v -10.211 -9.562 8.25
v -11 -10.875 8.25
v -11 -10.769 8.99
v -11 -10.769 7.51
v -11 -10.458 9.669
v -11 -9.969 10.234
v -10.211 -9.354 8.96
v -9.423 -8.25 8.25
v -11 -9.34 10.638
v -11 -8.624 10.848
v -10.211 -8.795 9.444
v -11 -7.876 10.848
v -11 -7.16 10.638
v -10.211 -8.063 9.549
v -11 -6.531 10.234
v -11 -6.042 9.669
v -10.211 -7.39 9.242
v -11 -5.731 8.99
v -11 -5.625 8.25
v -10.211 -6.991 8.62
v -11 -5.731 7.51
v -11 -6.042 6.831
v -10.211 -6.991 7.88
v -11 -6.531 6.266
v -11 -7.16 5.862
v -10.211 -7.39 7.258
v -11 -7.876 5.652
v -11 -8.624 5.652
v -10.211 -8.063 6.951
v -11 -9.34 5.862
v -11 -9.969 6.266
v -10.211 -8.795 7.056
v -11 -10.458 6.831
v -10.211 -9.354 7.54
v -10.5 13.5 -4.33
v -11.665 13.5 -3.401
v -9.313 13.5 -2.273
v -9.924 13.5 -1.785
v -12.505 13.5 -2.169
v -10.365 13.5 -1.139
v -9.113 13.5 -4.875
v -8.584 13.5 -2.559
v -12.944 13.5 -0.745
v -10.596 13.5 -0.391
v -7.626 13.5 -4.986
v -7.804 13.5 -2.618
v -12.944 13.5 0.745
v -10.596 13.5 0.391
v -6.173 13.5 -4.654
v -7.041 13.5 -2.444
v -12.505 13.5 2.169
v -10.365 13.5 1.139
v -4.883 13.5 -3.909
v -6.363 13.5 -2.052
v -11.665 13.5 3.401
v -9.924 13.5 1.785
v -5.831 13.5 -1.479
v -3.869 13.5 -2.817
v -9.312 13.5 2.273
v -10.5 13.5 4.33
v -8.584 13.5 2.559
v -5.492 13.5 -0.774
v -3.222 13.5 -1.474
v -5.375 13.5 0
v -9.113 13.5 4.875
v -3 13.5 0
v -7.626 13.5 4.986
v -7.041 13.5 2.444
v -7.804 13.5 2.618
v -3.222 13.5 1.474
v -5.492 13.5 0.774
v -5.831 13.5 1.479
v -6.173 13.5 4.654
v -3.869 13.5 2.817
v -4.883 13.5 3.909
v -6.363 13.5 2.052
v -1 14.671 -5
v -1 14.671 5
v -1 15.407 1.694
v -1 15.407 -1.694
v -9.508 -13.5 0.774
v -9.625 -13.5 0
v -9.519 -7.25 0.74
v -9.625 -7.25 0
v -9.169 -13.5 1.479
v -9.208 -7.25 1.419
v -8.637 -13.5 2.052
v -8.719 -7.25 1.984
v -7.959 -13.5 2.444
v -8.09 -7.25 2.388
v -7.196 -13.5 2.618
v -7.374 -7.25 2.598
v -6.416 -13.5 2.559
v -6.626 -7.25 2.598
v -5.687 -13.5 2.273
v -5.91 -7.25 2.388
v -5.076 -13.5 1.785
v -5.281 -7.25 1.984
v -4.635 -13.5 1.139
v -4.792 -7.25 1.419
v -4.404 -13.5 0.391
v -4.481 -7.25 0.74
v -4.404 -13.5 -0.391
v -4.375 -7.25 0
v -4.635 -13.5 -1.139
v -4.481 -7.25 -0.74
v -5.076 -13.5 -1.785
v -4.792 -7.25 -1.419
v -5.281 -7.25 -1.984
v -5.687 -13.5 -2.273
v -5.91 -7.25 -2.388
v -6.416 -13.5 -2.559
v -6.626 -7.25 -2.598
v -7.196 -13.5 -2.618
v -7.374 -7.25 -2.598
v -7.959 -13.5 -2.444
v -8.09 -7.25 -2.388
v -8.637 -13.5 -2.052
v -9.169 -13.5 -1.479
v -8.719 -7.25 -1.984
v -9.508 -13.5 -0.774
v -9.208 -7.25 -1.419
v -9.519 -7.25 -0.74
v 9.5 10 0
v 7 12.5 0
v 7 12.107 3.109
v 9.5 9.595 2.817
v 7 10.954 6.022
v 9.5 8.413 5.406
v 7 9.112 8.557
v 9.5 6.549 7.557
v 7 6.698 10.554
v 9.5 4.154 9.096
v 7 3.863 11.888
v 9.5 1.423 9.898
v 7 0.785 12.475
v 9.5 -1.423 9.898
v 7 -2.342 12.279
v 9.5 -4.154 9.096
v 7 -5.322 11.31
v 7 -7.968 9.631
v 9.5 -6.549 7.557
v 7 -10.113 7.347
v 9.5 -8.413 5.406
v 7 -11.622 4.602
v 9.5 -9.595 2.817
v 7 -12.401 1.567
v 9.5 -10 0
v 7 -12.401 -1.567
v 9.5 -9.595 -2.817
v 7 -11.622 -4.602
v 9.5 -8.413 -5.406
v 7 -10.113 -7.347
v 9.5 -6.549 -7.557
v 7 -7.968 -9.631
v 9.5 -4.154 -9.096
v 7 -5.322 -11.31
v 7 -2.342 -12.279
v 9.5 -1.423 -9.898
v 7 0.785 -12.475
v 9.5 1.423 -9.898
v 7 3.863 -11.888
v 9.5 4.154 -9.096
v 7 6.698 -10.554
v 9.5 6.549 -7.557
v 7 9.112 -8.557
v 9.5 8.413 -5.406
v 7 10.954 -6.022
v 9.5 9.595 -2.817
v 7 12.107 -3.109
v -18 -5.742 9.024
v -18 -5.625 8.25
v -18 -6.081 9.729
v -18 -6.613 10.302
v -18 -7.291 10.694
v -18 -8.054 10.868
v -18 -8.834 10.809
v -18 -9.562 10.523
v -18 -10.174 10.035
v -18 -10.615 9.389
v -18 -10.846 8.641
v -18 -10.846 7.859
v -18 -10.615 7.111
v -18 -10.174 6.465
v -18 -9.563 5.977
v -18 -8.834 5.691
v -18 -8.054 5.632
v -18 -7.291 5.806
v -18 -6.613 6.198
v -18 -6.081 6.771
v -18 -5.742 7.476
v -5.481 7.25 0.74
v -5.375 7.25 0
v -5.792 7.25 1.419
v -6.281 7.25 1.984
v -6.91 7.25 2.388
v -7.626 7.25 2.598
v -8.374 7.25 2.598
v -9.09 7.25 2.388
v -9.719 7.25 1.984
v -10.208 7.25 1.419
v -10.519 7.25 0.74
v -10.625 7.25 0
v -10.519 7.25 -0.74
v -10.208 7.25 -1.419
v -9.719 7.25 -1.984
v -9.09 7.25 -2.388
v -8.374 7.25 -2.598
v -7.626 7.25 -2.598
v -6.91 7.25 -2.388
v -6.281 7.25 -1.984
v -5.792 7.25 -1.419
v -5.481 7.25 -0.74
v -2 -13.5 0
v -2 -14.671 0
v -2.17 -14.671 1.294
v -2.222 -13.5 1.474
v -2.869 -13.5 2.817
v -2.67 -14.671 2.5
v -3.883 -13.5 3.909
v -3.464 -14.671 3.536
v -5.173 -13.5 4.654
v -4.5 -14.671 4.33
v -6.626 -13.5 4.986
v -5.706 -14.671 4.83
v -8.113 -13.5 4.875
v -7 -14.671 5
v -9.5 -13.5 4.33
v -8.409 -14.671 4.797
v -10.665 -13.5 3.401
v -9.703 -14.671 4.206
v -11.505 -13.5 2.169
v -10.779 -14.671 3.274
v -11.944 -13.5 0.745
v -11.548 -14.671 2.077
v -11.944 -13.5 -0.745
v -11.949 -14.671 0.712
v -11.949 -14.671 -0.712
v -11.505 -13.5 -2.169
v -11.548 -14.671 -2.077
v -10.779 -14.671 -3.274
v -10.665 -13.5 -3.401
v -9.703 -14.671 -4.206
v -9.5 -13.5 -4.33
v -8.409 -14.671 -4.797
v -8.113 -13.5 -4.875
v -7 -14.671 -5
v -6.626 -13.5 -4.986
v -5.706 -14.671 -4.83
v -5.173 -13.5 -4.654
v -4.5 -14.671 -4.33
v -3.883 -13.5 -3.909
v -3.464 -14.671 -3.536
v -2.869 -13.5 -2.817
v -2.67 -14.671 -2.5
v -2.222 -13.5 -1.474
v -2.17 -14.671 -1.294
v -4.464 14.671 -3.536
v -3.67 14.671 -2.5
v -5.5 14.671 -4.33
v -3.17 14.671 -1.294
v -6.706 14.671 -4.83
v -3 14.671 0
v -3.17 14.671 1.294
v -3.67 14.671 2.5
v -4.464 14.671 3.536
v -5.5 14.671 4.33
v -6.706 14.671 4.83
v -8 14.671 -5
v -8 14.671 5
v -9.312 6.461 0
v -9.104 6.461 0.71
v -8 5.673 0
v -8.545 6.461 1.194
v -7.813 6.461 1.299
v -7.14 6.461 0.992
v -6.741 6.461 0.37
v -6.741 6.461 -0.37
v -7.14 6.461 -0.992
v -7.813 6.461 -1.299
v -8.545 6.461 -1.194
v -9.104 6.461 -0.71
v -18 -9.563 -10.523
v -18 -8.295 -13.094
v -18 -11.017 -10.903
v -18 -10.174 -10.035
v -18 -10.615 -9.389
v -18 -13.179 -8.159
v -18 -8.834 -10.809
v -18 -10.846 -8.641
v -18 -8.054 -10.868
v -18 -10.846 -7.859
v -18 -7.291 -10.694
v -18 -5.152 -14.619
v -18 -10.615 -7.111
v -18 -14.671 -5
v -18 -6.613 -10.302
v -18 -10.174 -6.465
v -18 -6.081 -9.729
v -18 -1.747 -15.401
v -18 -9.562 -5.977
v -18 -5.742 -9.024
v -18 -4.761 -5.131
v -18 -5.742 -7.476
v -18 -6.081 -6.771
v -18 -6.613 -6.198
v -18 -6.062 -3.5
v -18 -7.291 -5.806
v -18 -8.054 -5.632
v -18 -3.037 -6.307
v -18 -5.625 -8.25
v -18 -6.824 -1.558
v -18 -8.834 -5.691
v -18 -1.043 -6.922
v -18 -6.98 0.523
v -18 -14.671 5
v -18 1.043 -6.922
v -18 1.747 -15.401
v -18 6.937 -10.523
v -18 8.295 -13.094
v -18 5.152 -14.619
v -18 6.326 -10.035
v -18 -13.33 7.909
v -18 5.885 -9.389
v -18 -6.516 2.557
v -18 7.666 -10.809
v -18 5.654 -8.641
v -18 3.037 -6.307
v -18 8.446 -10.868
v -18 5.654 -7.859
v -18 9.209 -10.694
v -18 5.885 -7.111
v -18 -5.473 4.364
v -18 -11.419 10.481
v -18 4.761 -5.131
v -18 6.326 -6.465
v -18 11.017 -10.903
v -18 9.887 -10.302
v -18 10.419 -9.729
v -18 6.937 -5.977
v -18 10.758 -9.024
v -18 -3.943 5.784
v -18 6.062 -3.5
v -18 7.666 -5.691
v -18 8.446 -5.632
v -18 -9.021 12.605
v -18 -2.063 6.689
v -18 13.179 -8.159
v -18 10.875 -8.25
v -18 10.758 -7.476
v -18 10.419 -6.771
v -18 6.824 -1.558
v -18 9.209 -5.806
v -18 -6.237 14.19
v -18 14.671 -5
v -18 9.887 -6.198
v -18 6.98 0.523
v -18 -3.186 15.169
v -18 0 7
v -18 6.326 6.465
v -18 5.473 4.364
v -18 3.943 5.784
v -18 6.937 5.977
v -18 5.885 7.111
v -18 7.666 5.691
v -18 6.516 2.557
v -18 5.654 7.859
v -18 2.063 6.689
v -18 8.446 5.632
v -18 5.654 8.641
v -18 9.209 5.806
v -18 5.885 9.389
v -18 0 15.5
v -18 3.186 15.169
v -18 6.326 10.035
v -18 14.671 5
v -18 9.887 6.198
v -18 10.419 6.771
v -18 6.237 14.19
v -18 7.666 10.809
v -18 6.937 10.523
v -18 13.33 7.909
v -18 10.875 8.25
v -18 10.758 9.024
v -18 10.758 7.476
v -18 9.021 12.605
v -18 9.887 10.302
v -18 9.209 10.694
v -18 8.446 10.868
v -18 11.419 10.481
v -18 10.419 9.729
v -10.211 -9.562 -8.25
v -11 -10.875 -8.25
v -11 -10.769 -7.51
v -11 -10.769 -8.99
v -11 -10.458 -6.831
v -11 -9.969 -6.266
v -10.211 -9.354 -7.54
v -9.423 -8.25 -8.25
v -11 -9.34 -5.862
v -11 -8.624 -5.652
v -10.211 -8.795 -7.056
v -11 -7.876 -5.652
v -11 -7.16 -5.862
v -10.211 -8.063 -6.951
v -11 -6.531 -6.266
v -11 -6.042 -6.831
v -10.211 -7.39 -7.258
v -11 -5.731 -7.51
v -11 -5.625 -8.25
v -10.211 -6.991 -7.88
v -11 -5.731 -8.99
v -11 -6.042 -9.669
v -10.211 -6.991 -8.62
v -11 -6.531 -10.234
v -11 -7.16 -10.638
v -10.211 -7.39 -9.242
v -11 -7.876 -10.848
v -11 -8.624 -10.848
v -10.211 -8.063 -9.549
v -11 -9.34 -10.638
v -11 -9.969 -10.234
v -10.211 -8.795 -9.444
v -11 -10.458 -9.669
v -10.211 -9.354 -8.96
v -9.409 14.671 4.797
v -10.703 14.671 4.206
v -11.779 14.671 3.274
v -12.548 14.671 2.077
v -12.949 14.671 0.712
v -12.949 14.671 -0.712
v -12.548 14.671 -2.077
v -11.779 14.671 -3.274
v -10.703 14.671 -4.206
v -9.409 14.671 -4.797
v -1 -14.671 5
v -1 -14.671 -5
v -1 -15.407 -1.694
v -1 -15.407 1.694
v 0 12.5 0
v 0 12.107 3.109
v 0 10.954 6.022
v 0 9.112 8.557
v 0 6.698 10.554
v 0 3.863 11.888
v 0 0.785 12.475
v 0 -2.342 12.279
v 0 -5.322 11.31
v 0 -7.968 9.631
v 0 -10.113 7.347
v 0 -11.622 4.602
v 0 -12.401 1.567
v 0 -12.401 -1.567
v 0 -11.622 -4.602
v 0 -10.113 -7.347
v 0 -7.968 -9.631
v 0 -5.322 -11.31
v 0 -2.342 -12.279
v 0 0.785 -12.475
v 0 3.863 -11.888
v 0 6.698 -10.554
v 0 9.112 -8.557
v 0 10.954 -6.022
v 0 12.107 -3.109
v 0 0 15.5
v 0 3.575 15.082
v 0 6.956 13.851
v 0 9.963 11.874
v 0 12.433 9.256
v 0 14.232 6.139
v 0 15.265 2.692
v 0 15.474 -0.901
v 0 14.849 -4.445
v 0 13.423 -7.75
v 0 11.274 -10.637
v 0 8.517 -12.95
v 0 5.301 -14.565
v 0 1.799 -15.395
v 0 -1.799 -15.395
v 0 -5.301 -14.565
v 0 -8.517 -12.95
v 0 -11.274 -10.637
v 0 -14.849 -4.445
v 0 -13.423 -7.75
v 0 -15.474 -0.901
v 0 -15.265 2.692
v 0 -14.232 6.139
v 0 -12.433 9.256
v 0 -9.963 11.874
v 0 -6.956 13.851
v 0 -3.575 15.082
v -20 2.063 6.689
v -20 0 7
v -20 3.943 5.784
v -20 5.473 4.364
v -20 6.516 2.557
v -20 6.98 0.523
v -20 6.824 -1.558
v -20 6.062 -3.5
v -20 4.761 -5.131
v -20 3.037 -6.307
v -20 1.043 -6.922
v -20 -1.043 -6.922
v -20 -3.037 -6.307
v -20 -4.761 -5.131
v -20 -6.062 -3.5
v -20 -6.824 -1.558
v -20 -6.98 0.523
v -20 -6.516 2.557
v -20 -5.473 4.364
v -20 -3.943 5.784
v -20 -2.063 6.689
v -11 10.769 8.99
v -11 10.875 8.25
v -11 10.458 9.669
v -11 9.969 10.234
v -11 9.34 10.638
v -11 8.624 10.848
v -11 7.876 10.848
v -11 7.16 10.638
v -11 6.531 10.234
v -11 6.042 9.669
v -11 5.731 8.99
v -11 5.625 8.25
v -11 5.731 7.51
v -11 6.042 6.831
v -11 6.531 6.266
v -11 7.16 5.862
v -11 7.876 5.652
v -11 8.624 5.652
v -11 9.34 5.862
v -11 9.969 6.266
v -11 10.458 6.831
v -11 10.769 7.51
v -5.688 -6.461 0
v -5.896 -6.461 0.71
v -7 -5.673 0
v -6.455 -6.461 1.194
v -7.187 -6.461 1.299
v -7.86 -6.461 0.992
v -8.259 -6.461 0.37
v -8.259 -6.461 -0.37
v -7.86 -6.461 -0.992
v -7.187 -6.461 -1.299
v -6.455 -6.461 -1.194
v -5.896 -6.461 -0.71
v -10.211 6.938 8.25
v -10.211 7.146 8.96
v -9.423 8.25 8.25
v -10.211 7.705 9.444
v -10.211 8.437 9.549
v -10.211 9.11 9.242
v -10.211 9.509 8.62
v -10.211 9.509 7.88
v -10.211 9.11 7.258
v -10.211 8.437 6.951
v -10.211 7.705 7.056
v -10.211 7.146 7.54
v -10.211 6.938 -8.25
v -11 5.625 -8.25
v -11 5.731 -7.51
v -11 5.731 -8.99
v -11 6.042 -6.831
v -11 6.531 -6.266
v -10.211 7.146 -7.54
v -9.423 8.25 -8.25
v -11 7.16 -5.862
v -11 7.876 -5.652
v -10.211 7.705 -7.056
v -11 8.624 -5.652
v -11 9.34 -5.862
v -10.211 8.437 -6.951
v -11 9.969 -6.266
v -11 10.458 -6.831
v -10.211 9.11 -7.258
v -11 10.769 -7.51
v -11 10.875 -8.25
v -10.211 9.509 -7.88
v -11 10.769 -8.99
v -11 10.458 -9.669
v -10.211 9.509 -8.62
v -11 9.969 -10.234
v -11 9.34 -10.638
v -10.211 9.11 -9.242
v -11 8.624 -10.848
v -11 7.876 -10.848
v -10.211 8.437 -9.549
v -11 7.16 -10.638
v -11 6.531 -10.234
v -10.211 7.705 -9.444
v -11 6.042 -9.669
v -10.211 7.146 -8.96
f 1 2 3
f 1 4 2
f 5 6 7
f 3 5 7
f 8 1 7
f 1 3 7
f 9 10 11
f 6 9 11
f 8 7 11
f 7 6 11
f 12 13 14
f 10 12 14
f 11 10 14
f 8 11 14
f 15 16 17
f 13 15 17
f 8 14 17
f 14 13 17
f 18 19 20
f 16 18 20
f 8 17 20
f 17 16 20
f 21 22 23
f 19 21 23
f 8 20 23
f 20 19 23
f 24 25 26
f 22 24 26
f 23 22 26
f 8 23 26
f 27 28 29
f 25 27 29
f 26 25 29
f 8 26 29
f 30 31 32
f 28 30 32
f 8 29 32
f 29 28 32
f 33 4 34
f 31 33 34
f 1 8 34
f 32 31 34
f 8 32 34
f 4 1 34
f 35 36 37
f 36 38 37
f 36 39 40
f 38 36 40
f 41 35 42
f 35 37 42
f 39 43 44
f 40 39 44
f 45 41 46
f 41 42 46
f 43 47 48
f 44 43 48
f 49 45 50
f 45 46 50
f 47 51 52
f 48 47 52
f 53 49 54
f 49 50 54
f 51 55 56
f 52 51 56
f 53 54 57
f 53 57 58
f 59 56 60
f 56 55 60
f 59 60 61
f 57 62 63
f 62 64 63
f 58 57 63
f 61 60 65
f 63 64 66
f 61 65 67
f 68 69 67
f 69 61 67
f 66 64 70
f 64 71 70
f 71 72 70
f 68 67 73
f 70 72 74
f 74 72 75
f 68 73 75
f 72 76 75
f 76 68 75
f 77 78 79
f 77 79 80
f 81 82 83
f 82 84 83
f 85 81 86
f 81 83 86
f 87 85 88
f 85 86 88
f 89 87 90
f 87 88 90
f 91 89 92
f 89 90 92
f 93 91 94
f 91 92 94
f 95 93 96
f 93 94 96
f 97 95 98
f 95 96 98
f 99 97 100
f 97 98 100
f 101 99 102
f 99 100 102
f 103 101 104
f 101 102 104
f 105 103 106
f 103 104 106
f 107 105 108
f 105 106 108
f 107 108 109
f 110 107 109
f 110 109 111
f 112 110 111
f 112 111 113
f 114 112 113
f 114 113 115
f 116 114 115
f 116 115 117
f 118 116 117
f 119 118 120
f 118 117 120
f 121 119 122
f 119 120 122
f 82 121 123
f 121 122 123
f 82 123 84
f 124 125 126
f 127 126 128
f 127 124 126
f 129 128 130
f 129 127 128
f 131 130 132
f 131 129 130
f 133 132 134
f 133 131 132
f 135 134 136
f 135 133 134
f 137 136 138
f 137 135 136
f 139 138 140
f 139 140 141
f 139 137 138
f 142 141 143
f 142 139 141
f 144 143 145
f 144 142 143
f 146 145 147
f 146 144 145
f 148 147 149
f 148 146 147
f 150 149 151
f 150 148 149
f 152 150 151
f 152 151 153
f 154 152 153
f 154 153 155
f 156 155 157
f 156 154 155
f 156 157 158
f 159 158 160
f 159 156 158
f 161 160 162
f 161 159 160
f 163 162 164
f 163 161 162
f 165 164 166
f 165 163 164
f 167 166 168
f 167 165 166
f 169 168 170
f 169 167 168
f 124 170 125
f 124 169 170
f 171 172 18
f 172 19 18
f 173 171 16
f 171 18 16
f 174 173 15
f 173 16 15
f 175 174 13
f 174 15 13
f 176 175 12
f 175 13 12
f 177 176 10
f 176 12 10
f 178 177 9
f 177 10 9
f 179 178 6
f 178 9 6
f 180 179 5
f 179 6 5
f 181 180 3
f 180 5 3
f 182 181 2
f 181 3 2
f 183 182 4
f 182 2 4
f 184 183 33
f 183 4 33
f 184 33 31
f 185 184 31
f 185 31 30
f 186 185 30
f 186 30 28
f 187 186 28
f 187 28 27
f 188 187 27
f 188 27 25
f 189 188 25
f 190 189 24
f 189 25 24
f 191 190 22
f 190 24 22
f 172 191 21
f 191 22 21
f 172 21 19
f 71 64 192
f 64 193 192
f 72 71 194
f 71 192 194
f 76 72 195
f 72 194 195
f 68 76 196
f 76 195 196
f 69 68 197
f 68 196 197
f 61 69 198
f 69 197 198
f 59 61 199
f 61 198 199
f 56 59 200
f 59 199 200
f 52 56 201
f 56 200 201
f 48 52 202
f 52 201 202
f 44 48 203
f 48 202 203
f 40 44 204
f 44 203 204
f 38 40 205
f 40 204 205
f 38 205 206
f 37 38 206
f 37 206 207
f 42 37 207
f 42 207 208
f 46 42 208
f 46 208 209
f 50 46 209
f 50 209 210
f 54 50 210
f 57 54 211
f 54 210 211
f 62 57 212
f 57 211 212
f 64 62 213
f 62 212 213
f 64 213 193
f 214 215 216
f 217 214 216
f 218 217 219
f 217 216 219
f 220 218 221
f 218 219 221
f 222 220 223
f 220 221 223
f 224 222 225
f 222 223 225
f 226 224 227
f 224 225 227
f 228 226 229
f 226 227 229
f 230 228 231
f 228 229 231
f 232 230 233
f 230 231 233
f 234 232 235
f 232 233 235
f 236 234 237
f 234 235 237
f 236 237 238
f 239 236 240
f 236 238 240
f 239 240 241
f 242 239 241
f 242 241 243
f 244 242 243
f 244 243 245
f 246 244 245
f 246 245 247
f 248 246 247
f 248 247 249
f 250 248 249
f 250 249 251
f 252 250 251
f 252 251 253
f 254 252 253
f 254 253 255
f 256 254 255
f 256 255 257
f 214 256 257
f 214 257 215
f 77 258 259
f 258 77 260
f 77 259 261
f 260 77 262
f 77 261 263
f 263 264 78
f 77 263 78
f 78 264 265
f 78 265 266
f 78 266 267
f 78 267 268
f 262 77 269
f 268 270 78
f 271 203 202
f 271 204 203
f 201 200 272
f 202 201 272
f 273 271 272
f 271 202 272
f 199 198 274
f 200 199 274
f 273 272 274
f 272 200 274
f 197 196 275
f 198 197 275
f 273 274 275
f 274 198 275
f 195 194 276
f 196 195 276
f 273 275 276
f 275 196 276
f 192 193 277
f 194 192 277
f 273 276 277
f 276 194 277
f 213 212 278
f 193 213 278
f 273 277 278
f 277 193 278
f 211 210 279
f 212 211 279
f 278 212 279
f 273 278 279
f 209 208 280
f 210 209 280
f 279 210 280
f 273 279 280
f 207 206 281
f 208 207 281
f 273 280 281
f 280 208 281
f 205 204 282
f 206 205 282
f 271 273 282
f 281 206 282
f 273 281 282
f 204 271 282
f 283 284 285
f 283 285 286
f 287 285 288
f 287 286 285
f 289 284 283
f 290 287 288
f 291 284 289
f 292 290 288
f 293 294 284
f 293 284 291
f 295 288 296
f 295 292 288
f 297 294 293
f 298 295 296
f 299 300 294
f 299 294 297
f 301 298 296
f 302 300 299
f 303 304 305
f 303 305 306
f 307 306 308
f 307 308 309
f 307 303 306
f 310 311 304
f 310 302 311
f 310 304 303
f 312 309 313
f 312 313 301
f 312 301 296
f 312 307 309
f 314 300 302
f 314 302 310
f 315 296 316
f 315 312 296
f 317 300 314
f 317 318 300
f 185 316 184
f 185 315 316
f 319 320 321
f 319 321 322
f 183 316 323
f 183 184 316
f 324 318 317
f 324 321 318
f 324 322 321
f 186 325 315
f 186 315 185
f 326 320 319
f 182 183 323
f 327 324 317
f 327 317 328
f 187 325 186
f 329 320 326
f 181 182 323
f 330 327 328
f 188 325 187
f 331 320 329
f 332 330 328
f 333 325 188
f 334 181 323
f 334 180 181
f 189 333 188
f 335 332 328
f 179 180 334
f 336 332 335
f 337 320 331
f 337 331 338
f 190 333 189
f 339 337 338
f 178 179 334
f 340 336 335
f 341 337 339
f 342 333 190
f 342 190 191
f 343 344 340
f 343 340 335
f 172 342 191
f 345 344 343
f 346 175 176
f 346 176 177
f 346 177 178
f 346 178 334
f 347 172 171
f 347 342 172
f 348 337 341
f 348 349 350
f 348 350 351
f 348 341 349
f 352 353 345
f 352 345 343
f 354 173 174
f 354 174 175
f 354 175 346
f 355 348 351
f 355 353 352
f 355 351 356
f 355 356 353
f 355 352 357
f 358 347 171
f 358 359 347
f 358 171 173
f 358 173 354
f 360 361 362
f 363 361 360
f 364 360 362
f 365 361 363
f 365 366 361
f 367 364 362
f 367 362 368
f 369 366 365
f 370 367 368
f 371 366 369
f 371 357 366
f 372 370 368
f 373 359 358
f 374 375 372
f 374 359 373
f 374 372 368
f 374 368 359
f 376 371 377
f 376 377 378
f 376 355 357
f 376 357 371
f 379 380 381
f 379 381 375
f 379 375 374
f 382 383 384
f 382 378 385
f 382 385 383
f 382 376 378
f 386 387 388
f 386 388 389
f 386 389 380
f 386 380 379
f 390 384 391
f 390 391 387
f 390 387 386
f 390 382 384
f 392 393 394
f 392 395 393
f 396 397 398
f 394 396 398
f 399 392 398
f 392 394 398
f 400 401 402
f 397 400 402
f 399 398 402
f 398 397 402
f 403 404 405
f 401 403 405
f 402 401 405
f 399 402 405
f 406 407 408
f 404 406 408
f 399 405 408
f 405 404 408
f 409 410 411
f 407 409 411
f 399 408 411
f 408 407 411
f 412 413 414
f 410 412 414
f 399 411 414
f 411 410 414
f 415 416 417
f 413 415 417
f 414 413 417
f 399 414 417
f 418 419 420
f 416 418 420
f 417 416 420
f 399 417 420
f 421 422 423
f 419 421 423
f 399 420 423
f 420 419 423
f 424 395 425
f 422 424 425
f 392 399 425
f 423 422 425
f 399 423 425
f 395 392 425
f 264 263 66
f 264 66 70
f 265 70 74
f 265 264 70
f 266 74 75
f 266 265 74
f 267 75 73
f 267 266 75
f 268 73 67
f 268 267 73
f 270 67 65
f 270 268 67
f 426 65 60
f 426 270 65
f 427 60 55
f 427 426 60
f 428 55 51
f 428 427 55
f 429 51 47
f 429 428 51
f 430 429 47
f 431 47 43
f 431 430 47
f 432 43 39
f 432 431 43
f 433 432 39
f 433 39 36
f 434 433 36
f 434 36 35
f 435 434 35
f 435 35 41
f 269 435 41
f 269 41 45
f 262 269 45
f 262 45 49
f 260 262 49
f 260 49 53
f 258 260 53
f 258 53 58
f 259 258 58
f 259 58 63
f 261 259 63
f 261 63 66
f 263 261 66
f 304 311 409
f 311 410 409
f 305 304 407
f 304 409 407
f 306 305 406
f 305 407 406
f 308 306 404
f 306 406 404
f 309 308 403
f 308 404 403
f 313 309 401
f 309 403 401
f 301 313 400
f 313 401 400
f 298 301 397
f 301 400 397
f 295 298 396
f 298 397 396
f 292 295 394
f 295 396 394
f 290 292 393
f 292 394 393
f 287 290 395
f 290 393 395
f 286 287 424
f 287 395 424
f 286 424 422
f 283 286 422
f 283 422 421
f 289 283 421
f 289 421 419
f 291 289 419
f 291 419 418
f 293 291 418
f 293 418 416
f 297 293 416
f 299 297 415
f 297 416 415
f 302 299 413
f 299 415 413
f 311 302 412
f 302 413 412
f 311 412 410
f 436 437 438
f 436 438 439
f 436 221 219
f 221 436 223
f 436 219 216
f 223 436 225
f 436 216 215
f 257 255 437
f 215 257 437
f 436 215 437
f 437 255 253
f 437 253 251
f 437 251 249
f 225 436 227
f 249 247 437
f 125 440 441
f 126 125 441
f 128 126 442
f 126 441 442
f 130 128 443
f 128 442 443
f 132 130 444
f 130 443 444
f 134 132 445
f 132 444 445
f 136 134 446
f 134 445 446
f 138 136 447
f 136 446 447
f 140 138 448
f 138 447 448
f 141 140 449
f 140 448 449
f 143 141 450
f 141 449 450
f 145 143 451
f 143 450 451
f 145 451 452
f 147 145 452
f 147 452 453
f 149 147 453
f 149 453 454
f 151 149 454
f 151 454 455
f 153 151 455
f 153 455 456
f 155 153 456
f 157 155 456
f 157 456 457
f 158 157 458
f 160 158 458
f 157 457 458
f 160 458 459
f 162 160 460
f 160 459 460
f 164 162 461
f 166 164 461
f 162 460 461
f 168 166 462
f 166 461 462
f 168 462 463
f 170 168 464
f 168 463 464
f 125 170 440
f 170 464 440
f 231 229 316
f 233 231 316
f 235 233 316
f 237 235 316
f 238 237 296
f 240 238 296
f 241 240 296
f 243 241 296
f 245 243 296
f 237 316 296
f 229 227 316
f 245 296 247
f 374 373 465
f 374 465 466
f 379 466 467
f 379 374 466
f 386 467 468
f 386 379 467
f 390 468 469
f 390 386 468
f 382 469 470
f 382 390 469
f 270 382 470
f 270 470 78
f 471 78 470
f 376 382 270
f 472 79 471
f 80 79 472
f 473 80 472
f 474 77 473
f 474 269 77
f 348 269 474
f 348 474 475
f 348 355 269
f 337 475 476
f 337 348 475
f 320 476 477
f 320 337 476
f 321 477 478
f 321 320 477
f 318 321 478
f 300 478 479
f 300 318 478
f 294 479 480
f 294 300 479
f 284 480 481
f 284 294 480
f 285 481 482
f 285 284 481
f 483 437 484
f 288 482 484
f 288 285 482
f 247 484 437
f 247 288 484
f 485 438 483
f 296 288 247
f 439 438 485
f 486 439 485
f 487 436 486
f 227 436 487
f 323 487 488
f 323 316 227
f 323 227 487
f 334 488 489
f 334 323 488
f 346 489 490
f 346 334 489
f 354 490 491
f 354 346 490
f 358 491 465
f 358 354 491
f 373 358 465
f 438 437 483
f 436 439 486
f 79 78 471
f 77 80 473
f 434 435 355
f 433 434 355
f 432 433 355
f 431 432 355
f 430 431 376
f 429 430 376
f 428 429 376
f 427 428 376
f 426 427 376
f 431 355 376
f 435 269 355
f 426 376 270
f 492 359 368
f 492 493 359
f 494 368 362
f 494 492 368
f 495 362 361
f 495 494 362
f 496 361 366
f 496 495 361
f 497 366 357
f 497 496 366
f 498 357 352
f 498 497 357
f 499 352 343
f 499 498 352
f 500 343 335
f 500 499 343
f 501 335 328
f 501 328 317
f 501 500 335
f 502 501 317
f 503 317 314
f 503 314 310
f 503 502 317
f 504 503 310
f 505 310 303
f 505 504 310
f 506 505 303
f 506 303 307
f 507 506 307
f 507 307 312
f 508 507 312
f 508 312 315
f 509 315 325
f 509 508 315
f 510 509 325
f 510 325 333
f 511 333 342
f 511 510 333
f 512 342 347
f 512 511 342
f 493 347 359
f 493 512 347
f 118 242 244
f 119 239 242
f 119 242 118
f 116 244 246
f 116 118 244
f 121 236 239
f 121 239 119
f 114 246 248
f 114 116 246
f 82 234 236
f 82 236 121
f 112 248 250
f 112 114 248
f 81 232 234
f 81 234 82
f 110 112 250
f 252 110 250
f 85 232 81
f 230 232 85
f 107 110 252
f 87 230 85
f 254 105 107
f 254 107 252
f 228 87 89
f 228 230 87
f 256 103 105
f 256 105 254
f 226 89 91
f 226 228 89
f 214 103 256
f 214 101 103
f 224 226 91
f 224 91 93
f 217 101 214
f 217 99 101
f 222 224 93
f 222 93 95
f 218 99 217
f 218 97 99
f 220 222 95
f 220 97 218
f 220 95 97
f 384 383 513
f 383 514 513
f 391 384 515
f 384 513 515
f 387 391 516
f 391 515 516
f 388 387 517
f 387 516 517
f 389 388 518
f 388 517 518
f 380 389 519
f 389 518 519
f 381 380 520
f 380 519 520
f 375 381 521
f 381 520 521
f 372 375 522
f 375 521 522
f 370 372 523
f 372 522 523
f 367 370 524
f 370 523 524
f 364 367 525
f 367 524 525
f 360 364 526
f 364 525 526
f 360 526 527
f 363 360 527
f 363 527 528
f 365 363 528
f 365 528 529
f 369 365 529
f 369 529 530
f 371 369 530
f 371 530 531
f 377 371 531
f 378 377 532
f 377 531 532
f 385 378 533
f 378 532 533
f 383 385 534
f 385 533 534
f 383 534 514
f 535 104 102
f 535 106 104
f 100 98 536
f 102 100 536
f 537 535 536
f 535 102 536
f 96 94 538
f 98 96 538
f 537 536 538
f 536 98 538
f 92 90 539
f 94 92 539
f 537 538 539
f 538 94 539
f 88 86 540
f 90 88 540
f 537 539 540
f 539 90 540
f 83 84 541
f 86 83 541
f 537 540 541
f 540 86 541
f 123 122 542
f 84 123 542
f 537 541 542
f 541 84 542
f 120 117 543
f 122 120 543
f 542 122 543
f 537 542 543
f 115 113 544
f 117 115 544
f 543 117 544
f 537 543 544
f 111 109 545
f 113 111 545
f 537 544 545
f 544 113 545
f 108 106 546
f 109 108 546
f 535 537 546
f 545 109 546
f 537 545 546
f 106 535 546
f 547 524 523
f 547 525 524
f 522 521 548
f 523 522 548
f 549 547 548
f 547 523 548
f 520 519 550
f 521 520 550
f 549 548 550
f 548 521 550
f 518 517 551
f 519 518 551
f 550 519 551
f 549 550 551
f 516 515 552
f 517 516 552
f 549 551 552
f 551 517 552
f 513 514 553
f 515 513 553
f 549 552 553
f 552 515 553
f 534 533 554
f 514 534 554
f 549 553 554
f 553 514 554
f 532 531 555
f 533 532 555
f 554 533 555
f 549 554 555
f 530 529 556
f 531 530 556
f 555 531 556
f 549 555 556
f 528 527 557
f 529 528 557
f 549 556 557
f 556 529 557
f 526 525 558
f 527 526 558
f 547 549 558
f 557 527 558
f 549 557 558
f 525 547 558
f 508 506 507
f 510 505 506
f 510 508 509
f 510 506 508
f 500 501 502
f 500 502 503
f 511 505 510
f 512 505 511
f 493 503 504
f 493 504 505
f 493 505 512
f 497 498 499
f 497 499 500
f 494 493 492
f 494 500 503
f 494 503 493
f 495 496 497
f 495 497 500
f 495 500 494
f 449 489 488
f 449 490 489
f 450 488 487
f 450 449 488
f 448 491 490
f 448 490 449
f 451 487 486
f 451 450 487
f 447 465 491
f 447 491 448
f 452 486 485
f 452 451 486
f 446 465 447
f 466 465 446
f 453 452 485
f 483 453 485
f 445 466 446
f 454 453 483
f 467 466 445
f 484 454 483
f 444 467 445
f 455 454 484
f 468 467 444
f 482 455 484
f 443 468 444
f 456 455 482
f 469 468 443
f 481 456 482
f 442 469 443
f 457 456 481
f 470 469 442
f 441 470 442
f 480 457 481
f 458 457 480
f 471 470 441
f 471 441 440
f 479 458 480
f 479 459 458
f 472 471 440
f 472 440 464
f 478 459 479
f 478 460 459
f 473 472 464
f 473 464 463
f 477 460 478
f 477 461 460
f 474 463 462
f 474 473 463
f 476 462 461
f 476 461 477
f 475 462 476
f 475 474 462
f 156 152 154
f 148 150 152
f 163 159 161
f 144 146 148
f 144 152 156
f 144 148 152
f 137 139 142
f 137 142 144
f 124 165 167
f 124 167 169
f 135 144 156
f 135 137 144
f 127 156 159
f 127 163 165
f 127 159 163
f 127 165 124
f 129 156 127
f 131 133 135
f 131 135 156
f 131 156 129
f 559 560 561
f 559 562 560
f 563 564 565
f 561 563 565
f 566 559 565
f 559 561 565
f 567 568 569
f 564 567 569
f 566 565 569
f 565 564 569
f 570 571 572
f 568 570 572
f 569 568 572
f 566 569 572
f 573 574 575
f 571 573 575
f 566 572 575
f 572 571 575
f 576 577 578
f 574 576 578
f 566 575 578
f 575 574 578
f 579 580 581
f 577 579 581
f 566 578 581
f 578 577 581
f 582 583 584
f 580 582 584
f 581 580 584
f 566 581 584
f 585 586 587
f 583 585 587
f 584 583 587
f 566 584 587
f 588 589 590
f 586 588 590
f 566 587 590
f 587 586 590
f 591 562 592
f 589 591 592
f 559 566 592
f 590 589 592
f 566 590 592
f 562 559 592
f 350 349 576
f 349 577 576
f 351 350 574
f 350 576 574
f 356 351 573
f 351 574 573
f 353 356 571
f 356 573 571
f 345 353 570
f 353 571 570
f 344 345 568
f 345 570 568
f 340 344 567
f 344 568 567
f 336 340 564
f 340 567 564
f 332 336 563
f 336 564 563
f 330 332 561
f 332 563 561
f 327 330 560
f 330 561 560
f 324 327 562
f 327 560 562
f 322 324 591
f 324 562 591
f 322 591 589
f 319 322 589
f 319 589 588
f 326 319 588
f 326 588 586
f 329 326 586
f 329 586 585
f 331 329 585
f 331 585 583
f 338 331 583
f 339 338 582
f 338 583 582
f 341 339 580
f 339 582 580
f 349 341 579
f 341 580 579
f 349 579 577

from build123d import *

# Parameters (mm, degrees)
F2_R      = 1.5
F3_DEPTH  = 5
F5_D      = 5.25
F5_DEPTH  = 7
F5_TIP    = 1.5772591249
F7_R      = 5
F8_DEPTH  = 2
F10_D     = 5.25
F10_DEPTH = 6.25
F10_TIP   = 1.5772591249
F12_R     = 5
F13_DEPTH = 2
F15_D     = 5.25
F15_DEPTH = 6.25
F15_TIP   = 1.5772591249
F16_R     = 12.5
F17_DEPTH = 9.5
F18_SIZE  = 2.5
F20_DEPTH = 17


with BuildPart() as f1:
    # F0 (on Front) → F1 (revolve)
    with BuildSketch(Plane.XZ):
        Polygon((0, 0), (0, 5), (0, 15.5), (-18, 15.5), (-18, 7), (-20, 7), (-20, 5), (-20, 0), align=None)
    revolve(axis=Axis((-5.3004380733, 0, 0), (-1, 0, 0)))

    # F2 (on face) → F3 (cut)
    with BuildSketch(Plane(origin=(-18, 0, 0), x_dir=(0, -1, 0), z_dir=(-1, 0, 0))):
        with Locations((8.25, 8.25)):
            Circle(F2_R)
        with Locations((-8.25, 8.25)):
            Circle(F2_R)
        with Locations((-8.25, -8.25)):
            Circle(F2_R)
        with Locations((8.25, -8.25)):
            Circle(F2_R)
    extrude(amount=-F3_DEPTH, mode=Mode.SUBTRACT)

    # F5
    with Locations(Plane(origin=(-18, 0, 0), x_dir=(0, -1, 0), z_dir=(-1, 0, 0))):
        with Locations((-8.25, 8.25), (8.25, 8.25), (-8.25, -8.25), (8.25, -8.25)):
            Hole(F5_D / 2, depth=F5_DEPTH)
            with Locations((0, 0, -(F5_DEPTH + F5_TIP / 2))):  # 118° drill point
                Cone(0, F5_D / 2, F5_TIP, mode=Mode.SUBTRACT)

    # F7 (on offset) → F8 (cut)
    with BuildSketch(Plane.XZ.offset(15.5)):
        with Locations((-7, 0)):
            Circle(F7_R)
    extrude(amount=-F8_DEPTH, mode=Mode.SUBTRACT)

    # F10
    with Locations(Plane.XZ.offset(13.5)):
        with Locations((-7, 0)):
            Hole(F10_D / 2, depth=F10_DEPTH)
            with Locations((0, 0, -(F10_DEPTH + F10_TIP / 2))):  # 118° drill point
                Cone(0, F10_D / 2, F10_TIP, mode=Mode.SUBTRACT)

    # F12 (on offset) → F13 (cut)
    with BuildSketch(Plane.XZ.offset(-15.5)):
        with Locations((-8, 0)):
            Circle(F12_R)
    extrude(amount=F13_DEPTH, mode=Mode.SUBTRACT)

    # F15
    with Locations(Plane(origin=(0, 13.5, 0), x_dir=(-1, 0, 0), z_dir=(0, 1, 0))):
        with Locations((8, 0)):
            Hole(F15_D / 2, depth=F15_DEPTH)
            with Locations((0, 0, -(F15_DEPTH + F15_TIP / 2))):  # 118° drill point
                Cone(0, F15_D / 2, F15_TIP, mode=Mode.SUBTRACT)

    # F16 (on face) → F17 (join)
    with BuildSketch(Plane.YZ):
        Circle(F16_R)
    extrude(amount=F17_DEPTH)

    # F18
    f18_edges = [f1.edges().sort_by_distance(p)[0] for p in [
        (9.5, -12.5, 0),
    ]]
    chamfer(f18_edges, length=F18_SIZE)

    # F19 (on face) → F20 (cut)
    with BuildSketch(Plane(origin=(-18, 0, 0), x_dir=(0, -1, 0), z_dir=(-1, 0, 0))):
        with BuildLine():
            Line((-14.6714007511, -5), (-14.6714007511, 5))
            ThreePointArc((-14.6714007511, 5), (-15.5, 0), (-14.6714007511, -5))
        make_face()
        with BuildLine():
            ThreePointArc((14.6714007511, -5), (15.5, 0), (14.6714007511, 5))
            Line((14.6714007511, 5), (14.6714007511, -5))
        make_face()
    extrude(amount=-F20_DEPTH, mode=Mode.SUBTRACT)


solid = f1.part
